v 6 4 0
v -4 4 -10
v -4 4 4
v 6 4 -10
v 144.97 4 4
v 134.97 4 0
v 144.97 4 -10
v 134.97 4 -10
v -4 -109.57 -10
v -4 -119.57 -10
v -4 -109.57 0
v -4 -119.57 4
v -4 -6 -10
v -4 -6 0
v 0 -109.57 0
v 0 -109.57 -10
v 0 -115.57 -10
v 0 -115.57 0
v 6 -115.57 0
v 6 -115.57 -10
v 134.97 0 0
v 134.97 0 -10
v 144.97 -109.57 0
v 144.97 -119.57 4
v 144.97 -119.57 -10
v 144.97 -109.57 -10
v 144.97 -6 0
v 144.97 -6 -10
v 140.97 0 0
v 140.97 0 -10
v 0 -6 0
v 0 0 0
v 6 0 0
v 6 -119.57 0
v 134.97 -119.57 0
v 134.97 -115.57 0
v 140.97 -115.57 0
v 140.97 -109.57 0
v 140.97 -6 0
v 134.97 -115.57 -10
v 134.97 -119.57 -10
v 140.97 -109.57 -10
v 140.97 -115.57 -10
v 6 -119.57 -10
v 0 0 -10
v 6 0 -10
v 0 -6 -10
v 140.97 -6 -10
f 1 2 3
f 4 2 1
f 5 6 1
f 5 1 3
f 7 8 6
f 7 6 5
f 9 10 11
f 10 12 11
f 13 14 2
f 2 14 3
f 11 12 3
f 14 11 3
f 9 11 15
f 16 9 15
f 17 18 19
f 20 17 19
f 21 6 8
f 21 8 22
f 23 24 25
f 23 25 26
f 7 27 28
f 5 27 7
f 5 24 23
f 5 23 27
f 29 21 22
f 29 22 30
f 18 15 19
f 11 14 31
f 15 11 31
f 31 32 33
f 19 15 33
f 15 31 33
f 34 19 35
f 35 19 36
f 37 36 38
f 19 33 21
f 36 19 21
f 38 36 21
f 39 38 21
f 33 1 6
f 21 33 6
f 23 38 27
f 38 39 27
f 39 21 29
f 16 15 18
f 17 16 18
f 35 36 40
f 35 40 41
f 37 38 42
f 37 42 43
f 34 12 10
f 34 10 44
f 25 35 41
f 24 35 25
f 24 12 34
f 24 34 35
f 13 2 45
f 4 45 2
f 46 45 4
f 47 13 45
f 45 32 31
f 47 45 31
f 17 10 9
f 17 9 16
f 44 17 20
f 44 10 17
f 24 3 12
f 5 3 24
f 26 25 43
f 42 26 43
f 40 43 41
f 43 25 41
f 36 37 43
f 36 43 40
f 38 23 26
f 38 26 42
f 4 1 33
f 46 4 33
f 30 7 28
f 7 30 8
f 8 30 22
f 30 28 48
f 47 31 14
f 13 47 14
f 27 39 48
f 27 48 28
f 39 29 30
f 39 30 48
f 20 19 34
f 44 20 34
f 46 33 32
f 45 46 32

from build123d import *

# Parameters (mm, degrees)
F0_W     = 148.97
F0_H     = 123.57
F0_W_2   = 132.97
F0_H_2   = 107.57
F1_DEPTH = 4
F4_DEPTH = 10
F6_W     = 132.97
F6_H     = 107.57
F7_DEPTH = 4


# Not quite as in the source:
# - a pattern or mirror of a feature is missing from the dataset's text; its kind, count and spacing are read off the source's solid


with BuildPart() as f1:
    # F0 (on Top) → F1 (new body)
    with BuildSketch(Plane.XY):
        with Locations((70.485, -57.785)):
            Rectangle(F0_W, F0_H)
        with Locations((70.485, -57.785)):
            Rectangle(F0_W_2, F0_H_2, mode=Mode.SUBTRACT)
    extrude(amount=F1_DEPTH)

    # F2 (on face) → F4 (join)
    with BuildSketch(Plane(origin=(0, 0, 0), x_dir=(1, 0, 0), z_dir=(0, 0, -1))):
        Polygon((6, 119.57), (-4, 119.57), (-4, 109.57), (0, 109.57), (0, 115.57), (6, 115.57), align=None)
        Polygon((6, 0), (0, 0), (0, 6), (-4, 6), (-4, -4), (6, -4), align=None)
    f4 = extrude(amount=F4_DEPTH)

    # F4_copies: F4 across plane
    add(f4.mirror(Plane(origin=(70.485, 0, 0), x_dir=(0, 0, 1), z_dir=(1, 0, 0))))

    # F6 (on face) → F7 (join, through all)
    with BuildSketch(Plane.XY.offset(4)):
        with Locations((70.485, -57.785)):
            Rectangle(F6_W, F6_H)
    extrude(amount=-F7_DEPTH)


solid = f1.part
